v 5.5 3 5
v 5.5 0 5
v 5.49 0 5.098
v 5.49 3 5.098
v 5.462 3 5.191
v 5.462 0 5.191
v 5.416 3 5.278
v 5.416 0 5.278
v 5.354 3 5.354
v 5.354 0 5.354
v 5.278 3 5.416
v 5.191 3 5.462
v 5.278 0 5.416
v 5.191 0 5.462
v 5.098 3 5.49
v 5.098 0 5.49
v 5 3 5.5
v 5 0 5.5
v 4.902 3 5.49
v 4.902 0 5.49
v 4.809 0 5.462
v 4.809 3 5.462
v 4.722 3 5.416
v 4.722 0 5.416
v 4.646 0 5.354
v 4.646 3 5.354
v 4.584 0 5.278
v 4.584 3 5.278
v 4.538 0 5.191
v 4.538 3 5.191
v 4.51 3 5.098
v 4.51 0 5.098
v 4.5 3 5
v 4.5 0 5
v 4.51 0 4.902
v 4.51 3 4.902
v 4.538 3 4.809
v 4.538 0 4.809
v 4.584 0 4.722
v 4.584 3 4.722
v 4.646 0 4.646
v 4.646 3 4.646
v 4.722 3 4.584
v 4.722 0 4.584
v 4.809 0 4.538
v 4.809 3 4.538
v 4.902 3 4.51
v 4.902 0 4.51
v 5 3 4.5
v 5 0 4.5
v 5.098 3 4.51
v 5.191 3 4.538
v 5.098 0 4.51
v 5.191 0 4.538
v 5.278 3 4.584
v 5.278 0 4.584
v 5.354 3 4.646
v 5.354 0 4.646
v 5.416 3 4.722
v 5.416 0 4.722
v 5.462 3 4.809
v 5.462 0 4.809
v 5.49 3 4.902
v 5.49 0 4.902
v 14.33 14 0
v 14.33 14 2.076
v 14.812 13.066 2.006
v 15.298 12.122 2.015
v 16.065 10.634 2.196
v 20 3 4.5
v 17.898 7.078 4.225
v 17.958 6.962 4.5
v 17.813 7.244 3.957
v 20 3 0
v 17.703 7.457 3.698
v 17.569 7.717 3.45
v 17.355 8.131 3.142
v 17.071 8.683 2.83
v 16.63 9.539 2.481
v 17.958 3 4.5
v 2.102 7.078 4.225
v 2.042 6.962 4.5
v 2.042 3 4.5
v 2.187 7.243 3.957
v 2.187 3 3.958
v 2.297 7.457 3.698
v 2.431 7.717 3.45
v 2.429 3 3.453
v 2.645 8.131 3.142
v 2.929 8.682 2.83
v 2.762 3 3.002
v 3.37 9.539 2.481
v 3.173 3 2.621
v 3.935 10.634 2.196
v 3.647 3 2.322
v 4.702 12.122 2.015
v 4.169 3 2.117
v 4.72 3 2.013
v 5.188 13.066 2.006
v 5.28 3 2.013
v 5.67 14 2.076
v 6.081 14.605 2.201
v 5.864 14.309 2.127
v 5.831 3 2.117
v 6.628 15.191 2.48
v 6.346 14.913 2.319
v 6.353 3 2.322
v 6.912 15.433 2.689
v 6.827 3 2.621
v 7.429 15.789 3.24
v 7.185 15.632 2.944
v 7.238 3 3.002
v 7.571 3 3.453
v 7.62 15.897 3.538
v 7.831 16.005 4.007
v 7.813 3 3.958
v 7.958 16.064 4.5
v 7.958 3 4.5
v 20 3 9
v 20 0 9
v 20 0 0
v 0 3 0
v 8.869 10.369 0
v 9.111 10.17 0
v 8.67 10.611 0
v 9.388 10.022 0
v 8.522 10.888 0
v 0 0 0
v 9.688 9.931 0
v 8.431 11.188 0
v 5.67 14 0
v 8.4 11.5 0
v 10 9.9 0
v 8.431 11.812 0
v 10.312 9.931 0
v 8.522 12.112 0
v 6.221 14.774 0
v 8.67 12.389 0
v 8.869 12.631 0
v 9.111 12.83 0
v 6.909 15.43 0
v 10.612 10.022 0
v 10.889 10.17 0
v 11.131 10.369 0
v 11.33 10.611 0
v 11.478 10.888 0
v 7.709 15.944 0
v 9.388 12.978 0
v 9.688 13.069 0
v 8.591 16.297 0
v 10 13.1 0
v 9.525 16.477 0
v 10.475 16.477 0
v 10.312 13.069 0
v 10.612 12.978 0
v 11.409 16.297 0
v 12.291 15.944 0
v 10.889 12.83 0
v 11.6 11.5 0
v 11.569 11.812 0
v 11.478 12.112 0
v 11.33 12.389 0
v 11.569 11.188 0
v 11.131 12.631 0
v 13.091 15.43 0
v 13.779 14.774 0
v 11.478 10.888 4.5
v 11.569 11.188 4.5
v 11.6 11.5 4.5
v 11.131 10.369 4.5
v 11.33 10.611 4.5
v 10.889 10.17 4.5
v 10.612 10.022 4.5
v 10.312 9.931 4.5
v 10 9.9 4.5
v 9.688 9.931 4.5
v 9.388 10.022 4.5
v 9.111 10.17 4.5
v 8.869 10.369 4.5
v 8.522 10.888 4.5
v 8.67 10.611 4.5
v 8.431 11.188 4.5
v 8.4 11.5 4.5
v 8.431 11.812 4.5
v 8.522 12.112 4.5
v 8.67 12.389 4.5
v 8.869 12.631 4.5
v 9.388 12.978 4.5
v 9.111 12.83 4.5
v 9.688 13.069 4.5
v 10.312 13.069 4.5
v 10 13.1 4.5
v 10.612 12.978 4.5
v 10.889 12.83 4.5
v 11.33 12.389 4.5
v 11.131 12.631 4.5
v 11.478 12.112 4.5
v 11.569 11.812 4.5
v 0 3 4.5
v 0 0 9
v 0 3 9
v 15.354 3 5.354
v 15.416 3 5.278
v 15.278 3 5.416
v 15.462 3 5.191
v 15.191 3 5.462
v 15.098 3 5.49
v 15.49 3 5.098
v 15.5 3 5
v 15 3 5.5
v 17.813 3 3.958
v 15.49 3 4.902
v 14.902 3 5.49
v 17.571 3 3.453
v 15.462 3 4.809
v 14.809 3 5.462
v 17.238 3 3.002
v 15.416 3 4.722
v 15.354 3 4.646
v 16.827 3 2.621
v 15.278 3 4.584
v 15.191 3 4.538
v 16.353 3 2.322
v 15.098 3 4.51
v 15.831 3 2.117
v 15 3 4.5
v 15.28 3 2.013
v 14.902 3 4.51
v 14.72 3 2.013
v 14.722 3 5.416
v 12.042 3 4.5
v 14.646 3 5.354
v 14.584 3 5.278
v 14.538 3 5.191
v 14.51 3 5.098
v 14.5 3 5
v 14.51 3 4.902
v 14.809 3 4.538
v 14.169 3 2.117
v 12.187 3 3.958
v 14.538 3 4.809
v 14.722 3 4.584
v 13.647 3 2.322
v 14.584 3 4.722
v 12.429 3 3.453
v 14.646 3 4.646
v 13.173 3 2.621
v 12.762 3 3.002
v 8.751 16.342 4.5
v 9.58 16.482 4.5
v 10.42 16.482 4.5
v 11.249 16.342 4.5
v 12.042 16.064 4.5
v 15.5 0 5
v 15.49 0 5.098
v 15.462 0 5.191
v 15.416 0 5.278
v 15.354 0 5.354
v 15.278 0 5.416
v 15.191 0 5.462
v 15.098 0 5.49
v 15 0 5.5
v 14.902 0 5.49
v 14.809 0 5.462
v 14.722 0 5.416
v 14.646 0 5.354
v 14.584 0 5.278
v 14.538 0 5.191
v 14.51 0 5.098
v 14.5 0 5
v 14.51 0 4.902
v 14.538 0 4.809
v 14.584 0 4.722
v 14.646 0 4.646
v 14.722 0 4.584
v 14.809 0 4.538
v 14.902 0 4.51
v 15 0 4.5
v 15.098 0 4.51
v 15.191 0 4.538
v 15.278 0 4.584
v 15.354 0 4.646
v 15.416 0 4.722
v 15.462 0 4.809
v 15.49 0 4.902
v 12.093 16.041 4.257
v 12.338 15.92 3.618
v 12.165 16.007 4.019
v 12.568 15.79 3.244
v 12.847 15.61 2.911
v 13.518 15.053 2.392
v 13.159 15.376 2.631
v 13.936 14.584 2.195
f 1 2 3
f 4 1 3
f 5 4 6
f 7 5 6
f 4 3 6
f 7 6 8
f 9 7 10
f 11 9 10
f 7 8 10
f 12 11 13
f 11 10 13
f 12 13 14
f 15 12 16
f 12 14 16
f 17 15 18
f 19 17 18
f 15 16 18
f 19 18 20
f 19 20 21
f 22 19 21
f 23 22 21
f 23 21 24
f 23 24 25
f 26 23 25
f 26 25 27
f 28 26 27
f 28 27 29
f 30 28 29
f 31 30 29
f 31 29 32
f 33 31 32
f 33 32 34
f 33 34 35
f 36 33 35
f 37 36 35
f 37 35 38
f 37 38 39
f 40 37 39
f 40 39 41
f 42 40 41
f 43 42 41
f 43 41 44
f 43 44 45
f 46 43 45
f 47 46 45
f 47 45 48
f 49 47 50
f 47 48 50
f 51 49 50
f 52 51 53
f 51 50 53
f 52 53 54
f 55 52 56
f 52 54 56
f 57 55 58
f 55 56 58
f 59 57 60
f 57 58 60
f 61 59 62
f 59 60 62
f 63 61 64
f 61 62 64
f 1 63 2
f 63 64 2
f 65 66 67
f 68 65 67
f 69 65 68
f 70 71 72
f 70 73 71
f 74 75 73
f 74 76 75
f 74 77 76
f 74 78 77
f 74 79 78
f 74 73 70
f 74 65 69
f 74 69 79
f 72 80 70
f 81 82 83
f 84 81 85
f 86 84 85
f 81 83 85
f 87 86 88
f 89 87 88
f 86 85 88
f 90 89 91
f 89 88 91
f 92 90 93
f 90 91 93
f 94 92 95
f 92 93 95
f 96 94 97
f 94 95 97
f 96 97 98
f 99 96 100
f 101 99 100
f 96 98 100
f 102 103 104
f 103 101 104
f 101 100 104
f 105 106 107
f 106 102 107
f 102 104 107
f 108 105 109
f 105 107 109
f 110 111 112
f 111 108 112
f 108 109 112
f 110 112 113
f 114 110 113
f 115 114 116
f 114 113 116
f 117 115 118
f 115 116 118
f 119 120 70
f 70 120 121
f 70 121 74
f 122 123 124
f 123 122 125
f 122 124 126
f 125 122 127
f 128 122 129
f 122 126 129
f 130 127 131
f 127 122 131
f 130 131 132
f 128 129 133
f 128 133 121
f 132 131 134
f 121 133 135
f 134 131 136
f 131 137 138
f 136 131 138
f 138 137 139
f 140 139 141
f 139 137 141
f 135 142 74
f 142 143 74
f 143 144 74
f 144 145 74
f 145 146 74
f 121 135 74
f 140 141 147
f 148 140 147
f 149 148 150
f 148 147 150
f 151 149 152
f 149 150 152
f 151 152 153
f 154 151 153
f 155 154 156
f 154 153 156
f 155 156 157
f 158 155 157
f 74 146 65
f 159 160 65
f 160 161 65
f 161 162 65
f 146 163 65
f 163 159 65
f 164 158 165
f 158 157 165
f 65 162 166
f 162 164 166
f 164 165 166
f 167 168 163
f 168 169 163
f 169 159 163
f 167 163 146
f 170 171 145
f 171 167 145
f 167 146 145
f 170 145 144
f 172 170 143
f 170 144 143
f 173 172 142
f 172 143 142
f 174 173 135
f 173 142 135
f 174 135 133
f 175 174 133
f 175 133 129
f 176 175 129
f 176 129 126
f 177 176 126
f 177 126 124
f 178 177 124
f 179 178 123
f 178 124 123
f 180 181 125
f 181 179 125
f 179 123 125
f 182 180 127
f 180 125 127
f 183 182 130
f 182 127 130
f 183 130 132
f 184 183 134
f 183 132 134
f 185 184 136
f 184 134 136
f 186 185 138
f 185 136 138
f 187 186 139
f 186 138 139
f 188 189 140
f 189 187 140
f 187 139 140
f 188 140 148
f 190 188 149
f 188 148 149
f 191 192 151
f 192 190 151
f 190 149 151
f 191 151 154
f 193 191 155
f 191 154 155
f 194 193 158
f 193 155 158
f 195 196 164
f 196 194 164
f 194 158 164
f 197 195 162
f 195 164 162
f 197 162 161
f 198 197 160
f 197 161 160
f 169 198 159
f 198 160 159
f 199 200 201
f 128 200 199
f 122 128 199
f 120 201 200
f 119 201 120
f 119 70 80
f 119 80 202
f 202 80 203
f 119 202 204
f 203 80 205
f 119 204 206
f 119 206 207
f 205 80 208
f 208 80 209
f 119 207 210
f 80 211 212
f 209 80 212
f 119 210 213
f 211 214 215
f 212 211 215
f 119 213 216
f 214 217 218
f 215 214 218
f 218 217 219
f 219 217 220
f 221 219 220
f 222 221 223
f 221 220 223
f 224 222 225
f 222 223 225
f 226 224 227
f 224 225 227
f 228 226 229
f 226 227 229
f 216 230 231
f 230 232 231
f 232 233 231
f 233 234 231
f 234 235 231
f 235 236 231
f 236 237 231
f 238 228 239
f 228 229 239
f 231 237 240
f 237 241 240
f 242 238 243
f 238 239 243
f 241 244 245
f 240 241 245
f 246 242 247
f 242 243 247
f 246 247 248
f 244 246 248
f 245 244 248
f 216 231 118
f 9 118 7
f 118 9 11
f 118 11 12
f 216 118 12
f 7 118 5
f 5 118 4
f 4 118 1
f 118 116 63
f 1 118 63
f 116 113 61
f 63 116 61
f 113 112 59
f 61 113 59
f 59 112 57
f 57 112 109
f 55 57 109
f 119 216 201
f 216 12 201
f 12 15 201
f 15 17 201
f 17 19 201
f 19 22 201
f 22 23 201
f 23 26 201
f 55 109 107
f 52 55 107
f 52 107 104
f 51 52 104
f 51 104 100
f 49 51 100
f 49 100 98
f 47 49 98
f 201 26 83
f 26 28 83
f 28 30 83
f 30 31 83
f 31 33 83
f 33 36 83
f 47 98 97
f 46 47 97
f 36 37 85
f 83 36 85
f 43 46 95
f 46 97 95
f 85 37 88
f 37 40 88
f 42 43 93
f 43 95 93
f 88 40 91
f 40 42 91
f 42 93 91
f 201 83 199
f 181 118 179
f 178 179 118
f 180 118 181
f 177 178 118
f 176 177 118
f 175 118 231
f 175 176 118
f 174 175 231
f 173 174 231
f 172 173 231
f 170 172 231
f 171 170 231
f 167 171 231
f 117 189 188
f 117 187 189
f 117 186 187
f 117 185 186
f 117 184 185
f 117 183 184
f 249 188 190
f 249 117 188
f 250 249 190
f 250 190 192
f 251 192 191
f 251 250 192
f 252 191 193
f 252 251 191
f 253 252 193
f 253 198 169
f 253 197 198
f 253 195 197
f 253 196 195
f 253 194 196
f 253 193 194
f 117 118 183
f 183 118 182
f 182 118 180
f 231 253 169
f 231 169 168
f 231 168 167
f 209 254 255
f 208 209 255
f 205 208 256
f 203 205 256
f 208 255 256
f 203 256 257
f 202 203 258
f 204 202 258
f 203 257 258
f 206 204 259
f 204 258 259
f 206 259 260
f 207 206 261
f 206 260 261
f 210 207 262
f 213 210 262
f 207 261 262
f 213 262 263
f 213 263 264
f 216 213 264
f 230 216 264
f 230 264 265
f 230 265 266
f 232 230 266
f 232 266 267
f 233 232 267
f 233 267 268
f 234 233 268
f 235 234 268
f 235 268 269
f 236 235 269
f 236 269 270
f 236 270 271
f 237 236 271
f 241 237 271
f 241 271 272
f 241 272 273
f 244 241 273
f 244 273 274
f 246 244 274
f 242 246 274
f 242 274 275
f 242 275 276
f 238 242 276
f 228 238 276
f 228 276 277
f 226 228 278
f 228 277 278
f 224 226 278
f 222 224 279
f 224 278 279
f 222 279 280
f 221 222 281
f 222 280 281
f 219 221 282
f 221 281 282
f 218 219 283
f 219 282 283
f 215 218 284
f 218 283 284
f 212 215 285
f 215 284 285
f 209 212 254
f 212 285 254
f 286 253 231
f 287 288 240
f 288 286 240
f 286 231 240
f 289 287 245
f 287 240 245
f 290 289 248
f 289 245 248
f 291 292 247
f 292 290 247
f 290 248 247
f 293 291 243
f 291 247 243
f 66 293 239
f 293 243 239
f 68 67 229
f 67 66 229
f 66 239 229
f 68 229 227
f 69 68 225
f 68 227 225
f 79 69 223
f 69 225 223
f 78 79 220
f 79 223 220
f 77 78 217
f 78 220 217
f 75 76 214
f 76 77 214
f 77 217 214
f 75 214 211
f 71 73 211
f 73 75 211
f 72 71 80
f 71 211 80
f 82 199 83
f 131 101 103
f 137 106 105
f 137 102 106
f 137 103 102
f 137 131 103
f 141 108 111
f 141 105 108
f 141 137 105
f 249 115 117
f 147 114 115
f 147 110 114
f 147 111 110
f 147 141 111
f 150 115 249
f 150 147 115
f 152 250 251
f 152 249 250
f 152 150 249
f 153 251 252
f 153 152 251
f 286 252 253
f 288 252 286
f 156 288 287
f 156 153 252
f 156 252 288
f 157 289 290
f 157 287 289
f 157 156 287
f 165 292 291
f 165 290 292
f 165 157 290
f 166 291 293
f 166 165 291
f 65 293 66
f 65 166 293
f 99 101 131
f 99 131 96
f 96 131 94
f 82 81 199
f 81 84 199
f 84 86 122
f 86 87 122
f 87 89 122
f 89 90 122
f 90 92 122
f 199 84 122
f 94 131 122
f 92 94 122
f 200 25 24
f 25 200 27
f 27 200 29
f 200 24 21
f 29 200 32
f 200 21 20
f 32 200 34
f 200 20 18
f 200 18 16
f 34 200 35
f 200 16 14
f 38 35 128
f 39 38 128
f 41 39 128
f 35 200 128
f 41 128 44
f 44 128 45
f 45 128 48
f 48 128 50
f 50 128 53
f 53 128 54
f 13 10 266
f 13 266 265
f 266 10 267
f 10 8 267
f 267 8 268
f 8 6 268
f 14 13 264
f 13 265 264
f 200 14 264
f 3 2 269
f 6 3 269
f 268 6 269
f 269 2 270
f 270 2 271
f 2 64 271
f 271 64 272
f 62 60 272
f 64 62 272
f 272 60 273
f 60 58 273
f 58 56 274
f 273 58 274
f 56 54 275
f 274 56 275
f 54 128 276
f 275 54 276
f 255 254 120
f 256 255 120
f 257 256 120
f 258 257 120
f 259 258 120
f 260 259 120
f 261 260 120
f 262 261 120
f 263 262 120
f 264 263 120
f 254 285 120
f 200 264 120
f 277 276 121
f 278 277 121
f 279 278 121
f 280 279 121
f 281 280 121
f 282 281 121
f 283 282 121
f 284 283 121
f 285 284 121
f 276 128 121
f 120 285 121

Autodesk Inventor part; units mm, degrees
ref_plane "YZ Plane" through (0, 0, 0) normal (1, 0, 0) x (0, 1, 0)
ref_plane "XZ Plane" through (0, 0, 0) normal (0, 1, 0) x (-1, 0, 0)
ref_plane "XY Plane" through (0, 0, 0) normal (0, 0, 1) x (1, 0, 0)
sketch "Sketch1" plane through (0, 0, 0) normal (0, 0, 1) x (1, 0, 0)
  circle A0 centre (10, 11.5) radius 1.6
  line L0 (0, 0) -> (20.0001, 0)
  line L1 (0, 0) -> (0, 3)
  line L2 (20.0001, 0) -> (20.0001, 3)
  line L3 (0, 3) -> (16, 3) construction
  line L4 (20.0001, 3) -> (36.0001, 3) construction
  arc A1 (14.3301, 14) -> (5.6699, 14) centre (10, 11.5) ccw
  line L5 (10, 11.5) -> (5.6699, 14) construction
  line L6 (10, 11.5) -> (14.3301, 14) construction
  line L7 (5.6699, 14) -> (0, 3)
  line L8 (14.3301, 14) -> (20.0001, 3)
  dimension "d17" = 3
  dimension "d18" = 3
  dimension "d19" = 11.5
  dimension "d23" = 90
  dimension "d24" = 90
  dimension "d25" = 10
  dimension "d31" = 5
  dimension "d32" = 120
  dimension "d33" = 14
sketch "Sketch3" plane through (0, 0, 0) normal (0, 0, 1) x (1, 0, 0)
  point P0 (0, 0)
extrude "Extrusion1" add sketch "Sketch1" along normal blind 4.5
sketch "Sketch4" plane through (0, 0, 4.5) normal (0, 0, 1) x (1, 0, 0)
  line L0 (0, 3) -> (0, 0) projected
  line L1 (20.0001, 0) -> (20.0001, 3) projected
  line L2 (0, 0) -> (20.0001, 0)
  line L3 (20.0001, 0) -> (20.0001, 3)
  line L4 (3.884, 22.9404) -> (-0.9789, 3.2417) projected
  line L5 (20.0001, 3) -> (0, 3)
  line L6 (0, 3) -> (0, 0)
extrude "Extrusion2" add sketch "Sketch4" along normal blind 4.5
sketch "Sketch5" plane through (0, 0, 0) normal (0, -1, 0) x (1, 0, 0)
  circle A0 centre (5, 5) radius 0.5
  circle A1 centre (15, 5) radius 0.5
  line L0 (0, 0) -> (20.0001, 0) projected
  dimension "d13" = 1
  dimension "d14" = 1
  dimension "d38" = 5
  dimension "d39" = 5
extrude "Extrusion3" cut sketch "Sketch5" against normal blind 5.5
sketch "Sketch6" plane through (0, 3, 9) normal (0, 1, 0) x (1, 0, 0)
  circle A0 centre (5, 4) radius 0.5 projected
  circle A1 centre (5, 4) radius 3
  circle A2 centre (15, 4) radius 0.5 projected
  circle A3 centre (15, 4) radius 3
  line L0 (0, 9) -> (20.0001, 9) projected
  dimension "d34" = 6
  dimension "d35" = 6
  dimension "d40" = 5
  dimension "d41" = 5
extrude "Extrusion4" cut sketch "Sketch6" along normal up to next
properties part number "lower_deck_shaft_mount_for_AD"
